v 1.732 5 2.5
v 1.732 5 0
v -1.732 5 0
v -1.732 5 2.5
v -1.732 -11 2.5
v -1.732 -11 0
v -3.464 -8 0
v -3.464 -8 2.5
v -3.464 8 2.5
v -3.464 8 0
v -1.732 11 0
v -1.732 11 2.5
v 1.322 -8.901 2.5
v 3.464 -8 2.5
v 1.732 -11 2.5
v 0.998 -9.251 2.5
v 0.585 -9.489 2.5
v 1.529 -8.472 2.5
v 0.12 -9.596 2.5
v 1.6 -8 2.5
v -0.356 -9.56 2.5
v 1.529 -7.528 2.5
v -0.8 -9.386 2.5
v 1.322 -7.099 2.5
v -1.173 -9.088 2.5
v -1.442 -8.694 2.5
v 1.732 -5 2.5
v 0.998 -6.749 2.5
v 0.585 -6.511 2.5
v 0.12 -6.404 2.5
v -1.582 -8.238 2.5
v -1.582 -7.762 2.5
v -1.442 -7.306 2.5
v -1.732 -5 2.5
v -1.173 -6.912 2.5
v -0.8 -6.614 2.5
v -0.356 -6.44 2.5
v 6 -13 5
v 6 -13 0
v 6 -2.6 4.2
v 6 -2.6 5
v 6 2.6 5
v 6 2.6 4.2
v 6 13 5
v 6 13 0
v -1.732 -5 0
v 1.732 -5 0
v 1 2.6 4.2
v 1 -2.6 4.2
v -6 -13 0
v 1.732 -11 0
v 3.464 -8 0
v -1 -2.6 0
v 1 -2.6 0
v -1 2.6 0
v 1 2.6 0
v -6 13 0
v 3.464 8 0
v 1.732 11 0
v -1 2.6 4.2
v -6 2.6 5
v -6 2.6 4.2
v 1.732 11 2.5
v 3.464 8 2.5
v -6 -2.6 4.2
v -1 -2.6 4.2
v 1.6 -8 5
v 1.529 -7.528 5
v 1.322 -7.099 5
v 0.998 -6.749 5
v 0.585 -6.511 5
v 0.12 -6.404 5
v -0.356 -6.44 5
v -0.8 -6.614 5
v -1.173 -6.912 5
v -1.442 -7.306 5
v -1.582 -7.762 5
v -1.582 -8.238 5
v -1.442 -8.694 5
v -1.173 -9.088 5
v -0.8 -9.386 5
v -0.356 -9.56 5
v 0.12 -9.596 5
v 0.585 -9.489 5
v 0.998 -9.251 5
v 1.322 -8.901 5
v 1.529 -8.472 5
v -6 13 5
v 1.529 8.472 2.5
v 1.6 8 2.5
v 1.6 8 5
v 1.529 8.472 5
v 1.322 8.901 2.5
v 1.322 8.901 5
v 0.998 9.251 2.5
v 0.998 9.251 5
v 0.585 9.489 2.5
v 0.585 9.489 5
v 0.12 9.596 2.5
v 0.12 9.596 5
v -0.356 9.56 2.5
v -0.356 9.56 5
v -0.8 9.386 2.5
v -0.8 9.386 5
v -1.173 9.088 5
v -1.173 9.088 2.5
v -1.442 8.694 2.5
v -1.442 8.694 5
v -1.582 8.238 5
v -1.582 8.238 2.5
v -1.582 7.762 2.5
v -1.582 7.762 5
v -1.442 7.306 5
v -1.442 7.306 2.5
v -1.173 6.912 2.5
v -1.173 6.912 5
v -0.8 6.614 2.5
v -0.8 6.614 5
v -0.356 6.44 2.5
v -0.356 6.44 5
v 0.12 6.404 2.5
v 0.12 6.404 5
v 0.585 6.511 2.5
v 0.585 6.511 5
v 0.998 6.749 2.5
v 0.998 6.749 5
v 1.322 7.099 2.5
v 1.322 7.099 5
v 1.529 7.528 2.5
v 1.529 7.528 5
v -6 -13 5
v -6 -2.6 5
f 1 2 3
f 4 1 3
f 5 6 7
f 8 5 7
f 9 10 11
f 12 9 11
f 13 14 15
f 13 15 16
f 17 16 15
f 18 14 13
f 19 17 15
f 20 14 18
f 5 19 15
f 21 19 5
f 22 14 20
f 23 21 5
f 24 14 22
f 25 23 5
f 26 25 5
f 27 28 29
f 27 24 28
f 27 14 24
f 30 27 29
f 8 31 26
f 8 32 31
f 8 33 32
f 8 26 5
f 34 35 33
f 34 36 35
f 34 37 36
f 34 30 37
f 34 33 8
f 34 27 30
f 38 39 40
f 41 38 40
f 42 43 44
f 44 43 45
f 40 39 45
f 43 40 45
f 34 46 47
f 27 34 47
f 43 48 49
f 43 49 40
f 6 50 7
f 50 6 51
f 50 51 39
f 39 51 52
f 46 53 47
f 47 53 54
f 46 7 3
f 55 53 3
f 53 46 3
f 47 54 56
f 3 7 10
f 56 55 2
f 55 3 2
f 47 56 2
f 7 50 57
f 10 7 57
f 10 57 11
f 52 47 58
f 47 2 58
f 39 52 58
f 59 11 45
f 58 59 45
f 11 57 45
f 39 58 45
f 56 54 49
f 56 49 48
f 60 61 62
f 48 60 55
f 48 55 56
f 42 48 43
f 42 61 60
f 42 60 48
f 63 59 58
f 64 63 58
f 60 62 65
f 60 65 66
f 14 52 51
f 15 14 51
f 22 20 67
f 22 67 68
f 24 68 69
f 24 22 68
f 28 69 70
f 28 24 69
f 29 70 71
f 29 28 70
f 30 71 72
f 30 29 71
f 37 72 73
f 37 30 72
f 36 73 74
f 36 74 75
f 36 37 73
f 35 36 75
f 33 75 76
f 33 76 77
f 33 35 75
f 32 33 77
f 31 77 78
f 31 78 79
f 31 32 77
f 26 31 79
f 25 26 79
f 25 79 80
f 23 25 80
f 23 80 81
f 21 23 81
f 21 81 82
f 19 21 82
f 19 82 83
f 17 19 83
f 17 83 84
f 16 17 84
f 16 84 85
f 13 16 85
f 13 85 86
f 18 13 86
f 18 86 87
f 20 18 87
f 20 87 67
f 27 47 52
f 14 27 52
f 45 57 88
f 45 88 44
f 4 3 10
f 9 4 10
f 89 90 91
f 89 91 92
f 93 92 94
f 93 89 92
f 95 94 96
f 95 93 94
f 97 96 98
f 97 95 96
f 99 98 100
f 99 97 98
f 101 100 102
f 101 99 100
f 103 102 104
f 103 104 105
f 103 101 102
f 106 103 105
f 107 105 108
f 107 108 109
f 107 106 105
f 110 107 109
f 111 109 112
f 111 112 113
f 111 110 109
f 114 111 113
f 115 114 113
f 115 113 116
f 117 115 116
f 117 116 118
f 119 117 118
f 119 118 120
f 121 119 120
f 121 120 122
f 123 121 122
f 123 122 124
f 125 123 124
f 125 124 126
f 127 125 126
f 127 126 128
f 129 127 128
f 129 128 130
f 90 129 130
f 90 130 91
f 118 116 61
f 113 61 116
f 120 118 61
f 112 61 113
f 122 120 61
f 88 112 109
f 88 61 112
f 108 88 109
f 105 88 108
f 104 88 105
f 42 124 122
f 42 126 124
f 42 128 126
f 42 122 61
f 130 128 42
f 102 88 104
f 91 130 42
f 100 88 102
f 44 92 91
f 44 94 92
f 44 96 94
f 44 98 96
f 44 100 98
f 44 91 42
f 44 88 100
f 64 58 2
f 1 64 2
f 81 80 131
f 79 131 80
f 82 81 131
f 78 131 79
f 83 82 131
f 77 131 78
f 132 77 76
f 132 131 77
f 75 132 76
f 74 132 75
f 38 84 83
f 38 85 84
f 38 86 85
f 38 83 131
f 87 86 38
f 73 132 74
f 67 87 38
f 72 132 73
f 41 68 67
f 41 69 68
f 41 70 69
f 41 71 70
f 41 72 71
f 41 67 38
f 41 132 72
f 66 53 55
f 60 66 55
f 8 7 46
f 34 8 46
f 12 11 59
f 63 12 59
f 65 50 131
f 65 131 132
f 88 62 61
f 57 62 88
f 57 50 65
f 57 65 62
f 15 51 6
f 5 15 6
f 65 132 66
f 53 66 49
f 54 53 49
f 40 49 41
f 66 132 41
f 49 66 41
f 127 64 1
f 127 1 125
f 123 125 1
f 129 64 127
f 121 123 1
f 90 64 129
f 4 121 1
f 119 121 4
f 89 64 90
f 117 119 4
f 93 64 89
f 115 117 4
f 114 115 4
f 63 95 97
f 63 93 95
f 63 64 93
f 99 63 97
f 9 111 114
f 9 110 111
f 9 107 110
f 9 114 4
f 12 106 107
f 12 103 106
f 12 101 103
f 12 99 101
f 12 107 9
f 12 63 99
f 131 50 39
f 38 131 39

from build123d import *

# Parameters (mm, degrees)
SKETCH1_W           = 12
SKETCH1_H           = 26
SKETCH1_R           = 1.6
SKETCH1_W_2         = 2
SKETCH1_H_2         = 5.2
BOSS_EXTRUDE1_DEPTH = 5
SKETCH3_W           = 12
SKETCH3_H           = 5.2
CUT_EXTRUDE1_DEPTH  = 0.8
CUT_EXTRUDE2_DEPTH  = 2.5


with BuildPart() as part:
    # Sketch1 → Boss-Extrude1 (new body)
    with BuildSketch(Plane.XY):
        Rectangle(SKETCH1_W, SKETCH1_H)
        with Locations((0, 8)):
            Circle(SKETCH1_R, mode=Mode.SUBTRACT)
        with Locations((0, -8)):
            Circle(SKETCH1_R, mode=Mode.SUBTRACT)
        Rectangle(SKETCH1_W_2, SKETCH1_H_2, mode=Mode.SUBTRACT)
    extrude(amount=BOSS_EXTRUDE1_DEPTH)

    # Sketch3 → Cut-Extrude1 (cut)
    with BuildSketch(Plane.XY.offset(5)):
        Rectangle(SKETCH3_W, SKETCH3_H)
    extrude(amount=-CUT_EXTRUDE1_DEPTH, mode=Mode.SUBTRACT)

    # Sketch4 → Cut-Extrude2 (cut)
    with BuildSketch(Plane(origin=(0, 0, 0), x_dir=(-1, 0, 0), z_dir=(0, 0, -1))):
        Polygon((1.732050808, 11), (-1.732050808, 11), (-3.464101615, 8), (-1.732050808, 5), (1.732050808, 5), (3.464101615, 8), align=None)
        Polygon((1.732050808, -5), (-1.732050808, -5), (-3.464101615, -8), (-1.732050808, -11), (1.732050808, -11), (3.464101615, -8), align=None)
    extrude(amount=-CUT_EXTRUDE2_DEPTH, mode=Mode.SUBTRACT)


solid = part.part
